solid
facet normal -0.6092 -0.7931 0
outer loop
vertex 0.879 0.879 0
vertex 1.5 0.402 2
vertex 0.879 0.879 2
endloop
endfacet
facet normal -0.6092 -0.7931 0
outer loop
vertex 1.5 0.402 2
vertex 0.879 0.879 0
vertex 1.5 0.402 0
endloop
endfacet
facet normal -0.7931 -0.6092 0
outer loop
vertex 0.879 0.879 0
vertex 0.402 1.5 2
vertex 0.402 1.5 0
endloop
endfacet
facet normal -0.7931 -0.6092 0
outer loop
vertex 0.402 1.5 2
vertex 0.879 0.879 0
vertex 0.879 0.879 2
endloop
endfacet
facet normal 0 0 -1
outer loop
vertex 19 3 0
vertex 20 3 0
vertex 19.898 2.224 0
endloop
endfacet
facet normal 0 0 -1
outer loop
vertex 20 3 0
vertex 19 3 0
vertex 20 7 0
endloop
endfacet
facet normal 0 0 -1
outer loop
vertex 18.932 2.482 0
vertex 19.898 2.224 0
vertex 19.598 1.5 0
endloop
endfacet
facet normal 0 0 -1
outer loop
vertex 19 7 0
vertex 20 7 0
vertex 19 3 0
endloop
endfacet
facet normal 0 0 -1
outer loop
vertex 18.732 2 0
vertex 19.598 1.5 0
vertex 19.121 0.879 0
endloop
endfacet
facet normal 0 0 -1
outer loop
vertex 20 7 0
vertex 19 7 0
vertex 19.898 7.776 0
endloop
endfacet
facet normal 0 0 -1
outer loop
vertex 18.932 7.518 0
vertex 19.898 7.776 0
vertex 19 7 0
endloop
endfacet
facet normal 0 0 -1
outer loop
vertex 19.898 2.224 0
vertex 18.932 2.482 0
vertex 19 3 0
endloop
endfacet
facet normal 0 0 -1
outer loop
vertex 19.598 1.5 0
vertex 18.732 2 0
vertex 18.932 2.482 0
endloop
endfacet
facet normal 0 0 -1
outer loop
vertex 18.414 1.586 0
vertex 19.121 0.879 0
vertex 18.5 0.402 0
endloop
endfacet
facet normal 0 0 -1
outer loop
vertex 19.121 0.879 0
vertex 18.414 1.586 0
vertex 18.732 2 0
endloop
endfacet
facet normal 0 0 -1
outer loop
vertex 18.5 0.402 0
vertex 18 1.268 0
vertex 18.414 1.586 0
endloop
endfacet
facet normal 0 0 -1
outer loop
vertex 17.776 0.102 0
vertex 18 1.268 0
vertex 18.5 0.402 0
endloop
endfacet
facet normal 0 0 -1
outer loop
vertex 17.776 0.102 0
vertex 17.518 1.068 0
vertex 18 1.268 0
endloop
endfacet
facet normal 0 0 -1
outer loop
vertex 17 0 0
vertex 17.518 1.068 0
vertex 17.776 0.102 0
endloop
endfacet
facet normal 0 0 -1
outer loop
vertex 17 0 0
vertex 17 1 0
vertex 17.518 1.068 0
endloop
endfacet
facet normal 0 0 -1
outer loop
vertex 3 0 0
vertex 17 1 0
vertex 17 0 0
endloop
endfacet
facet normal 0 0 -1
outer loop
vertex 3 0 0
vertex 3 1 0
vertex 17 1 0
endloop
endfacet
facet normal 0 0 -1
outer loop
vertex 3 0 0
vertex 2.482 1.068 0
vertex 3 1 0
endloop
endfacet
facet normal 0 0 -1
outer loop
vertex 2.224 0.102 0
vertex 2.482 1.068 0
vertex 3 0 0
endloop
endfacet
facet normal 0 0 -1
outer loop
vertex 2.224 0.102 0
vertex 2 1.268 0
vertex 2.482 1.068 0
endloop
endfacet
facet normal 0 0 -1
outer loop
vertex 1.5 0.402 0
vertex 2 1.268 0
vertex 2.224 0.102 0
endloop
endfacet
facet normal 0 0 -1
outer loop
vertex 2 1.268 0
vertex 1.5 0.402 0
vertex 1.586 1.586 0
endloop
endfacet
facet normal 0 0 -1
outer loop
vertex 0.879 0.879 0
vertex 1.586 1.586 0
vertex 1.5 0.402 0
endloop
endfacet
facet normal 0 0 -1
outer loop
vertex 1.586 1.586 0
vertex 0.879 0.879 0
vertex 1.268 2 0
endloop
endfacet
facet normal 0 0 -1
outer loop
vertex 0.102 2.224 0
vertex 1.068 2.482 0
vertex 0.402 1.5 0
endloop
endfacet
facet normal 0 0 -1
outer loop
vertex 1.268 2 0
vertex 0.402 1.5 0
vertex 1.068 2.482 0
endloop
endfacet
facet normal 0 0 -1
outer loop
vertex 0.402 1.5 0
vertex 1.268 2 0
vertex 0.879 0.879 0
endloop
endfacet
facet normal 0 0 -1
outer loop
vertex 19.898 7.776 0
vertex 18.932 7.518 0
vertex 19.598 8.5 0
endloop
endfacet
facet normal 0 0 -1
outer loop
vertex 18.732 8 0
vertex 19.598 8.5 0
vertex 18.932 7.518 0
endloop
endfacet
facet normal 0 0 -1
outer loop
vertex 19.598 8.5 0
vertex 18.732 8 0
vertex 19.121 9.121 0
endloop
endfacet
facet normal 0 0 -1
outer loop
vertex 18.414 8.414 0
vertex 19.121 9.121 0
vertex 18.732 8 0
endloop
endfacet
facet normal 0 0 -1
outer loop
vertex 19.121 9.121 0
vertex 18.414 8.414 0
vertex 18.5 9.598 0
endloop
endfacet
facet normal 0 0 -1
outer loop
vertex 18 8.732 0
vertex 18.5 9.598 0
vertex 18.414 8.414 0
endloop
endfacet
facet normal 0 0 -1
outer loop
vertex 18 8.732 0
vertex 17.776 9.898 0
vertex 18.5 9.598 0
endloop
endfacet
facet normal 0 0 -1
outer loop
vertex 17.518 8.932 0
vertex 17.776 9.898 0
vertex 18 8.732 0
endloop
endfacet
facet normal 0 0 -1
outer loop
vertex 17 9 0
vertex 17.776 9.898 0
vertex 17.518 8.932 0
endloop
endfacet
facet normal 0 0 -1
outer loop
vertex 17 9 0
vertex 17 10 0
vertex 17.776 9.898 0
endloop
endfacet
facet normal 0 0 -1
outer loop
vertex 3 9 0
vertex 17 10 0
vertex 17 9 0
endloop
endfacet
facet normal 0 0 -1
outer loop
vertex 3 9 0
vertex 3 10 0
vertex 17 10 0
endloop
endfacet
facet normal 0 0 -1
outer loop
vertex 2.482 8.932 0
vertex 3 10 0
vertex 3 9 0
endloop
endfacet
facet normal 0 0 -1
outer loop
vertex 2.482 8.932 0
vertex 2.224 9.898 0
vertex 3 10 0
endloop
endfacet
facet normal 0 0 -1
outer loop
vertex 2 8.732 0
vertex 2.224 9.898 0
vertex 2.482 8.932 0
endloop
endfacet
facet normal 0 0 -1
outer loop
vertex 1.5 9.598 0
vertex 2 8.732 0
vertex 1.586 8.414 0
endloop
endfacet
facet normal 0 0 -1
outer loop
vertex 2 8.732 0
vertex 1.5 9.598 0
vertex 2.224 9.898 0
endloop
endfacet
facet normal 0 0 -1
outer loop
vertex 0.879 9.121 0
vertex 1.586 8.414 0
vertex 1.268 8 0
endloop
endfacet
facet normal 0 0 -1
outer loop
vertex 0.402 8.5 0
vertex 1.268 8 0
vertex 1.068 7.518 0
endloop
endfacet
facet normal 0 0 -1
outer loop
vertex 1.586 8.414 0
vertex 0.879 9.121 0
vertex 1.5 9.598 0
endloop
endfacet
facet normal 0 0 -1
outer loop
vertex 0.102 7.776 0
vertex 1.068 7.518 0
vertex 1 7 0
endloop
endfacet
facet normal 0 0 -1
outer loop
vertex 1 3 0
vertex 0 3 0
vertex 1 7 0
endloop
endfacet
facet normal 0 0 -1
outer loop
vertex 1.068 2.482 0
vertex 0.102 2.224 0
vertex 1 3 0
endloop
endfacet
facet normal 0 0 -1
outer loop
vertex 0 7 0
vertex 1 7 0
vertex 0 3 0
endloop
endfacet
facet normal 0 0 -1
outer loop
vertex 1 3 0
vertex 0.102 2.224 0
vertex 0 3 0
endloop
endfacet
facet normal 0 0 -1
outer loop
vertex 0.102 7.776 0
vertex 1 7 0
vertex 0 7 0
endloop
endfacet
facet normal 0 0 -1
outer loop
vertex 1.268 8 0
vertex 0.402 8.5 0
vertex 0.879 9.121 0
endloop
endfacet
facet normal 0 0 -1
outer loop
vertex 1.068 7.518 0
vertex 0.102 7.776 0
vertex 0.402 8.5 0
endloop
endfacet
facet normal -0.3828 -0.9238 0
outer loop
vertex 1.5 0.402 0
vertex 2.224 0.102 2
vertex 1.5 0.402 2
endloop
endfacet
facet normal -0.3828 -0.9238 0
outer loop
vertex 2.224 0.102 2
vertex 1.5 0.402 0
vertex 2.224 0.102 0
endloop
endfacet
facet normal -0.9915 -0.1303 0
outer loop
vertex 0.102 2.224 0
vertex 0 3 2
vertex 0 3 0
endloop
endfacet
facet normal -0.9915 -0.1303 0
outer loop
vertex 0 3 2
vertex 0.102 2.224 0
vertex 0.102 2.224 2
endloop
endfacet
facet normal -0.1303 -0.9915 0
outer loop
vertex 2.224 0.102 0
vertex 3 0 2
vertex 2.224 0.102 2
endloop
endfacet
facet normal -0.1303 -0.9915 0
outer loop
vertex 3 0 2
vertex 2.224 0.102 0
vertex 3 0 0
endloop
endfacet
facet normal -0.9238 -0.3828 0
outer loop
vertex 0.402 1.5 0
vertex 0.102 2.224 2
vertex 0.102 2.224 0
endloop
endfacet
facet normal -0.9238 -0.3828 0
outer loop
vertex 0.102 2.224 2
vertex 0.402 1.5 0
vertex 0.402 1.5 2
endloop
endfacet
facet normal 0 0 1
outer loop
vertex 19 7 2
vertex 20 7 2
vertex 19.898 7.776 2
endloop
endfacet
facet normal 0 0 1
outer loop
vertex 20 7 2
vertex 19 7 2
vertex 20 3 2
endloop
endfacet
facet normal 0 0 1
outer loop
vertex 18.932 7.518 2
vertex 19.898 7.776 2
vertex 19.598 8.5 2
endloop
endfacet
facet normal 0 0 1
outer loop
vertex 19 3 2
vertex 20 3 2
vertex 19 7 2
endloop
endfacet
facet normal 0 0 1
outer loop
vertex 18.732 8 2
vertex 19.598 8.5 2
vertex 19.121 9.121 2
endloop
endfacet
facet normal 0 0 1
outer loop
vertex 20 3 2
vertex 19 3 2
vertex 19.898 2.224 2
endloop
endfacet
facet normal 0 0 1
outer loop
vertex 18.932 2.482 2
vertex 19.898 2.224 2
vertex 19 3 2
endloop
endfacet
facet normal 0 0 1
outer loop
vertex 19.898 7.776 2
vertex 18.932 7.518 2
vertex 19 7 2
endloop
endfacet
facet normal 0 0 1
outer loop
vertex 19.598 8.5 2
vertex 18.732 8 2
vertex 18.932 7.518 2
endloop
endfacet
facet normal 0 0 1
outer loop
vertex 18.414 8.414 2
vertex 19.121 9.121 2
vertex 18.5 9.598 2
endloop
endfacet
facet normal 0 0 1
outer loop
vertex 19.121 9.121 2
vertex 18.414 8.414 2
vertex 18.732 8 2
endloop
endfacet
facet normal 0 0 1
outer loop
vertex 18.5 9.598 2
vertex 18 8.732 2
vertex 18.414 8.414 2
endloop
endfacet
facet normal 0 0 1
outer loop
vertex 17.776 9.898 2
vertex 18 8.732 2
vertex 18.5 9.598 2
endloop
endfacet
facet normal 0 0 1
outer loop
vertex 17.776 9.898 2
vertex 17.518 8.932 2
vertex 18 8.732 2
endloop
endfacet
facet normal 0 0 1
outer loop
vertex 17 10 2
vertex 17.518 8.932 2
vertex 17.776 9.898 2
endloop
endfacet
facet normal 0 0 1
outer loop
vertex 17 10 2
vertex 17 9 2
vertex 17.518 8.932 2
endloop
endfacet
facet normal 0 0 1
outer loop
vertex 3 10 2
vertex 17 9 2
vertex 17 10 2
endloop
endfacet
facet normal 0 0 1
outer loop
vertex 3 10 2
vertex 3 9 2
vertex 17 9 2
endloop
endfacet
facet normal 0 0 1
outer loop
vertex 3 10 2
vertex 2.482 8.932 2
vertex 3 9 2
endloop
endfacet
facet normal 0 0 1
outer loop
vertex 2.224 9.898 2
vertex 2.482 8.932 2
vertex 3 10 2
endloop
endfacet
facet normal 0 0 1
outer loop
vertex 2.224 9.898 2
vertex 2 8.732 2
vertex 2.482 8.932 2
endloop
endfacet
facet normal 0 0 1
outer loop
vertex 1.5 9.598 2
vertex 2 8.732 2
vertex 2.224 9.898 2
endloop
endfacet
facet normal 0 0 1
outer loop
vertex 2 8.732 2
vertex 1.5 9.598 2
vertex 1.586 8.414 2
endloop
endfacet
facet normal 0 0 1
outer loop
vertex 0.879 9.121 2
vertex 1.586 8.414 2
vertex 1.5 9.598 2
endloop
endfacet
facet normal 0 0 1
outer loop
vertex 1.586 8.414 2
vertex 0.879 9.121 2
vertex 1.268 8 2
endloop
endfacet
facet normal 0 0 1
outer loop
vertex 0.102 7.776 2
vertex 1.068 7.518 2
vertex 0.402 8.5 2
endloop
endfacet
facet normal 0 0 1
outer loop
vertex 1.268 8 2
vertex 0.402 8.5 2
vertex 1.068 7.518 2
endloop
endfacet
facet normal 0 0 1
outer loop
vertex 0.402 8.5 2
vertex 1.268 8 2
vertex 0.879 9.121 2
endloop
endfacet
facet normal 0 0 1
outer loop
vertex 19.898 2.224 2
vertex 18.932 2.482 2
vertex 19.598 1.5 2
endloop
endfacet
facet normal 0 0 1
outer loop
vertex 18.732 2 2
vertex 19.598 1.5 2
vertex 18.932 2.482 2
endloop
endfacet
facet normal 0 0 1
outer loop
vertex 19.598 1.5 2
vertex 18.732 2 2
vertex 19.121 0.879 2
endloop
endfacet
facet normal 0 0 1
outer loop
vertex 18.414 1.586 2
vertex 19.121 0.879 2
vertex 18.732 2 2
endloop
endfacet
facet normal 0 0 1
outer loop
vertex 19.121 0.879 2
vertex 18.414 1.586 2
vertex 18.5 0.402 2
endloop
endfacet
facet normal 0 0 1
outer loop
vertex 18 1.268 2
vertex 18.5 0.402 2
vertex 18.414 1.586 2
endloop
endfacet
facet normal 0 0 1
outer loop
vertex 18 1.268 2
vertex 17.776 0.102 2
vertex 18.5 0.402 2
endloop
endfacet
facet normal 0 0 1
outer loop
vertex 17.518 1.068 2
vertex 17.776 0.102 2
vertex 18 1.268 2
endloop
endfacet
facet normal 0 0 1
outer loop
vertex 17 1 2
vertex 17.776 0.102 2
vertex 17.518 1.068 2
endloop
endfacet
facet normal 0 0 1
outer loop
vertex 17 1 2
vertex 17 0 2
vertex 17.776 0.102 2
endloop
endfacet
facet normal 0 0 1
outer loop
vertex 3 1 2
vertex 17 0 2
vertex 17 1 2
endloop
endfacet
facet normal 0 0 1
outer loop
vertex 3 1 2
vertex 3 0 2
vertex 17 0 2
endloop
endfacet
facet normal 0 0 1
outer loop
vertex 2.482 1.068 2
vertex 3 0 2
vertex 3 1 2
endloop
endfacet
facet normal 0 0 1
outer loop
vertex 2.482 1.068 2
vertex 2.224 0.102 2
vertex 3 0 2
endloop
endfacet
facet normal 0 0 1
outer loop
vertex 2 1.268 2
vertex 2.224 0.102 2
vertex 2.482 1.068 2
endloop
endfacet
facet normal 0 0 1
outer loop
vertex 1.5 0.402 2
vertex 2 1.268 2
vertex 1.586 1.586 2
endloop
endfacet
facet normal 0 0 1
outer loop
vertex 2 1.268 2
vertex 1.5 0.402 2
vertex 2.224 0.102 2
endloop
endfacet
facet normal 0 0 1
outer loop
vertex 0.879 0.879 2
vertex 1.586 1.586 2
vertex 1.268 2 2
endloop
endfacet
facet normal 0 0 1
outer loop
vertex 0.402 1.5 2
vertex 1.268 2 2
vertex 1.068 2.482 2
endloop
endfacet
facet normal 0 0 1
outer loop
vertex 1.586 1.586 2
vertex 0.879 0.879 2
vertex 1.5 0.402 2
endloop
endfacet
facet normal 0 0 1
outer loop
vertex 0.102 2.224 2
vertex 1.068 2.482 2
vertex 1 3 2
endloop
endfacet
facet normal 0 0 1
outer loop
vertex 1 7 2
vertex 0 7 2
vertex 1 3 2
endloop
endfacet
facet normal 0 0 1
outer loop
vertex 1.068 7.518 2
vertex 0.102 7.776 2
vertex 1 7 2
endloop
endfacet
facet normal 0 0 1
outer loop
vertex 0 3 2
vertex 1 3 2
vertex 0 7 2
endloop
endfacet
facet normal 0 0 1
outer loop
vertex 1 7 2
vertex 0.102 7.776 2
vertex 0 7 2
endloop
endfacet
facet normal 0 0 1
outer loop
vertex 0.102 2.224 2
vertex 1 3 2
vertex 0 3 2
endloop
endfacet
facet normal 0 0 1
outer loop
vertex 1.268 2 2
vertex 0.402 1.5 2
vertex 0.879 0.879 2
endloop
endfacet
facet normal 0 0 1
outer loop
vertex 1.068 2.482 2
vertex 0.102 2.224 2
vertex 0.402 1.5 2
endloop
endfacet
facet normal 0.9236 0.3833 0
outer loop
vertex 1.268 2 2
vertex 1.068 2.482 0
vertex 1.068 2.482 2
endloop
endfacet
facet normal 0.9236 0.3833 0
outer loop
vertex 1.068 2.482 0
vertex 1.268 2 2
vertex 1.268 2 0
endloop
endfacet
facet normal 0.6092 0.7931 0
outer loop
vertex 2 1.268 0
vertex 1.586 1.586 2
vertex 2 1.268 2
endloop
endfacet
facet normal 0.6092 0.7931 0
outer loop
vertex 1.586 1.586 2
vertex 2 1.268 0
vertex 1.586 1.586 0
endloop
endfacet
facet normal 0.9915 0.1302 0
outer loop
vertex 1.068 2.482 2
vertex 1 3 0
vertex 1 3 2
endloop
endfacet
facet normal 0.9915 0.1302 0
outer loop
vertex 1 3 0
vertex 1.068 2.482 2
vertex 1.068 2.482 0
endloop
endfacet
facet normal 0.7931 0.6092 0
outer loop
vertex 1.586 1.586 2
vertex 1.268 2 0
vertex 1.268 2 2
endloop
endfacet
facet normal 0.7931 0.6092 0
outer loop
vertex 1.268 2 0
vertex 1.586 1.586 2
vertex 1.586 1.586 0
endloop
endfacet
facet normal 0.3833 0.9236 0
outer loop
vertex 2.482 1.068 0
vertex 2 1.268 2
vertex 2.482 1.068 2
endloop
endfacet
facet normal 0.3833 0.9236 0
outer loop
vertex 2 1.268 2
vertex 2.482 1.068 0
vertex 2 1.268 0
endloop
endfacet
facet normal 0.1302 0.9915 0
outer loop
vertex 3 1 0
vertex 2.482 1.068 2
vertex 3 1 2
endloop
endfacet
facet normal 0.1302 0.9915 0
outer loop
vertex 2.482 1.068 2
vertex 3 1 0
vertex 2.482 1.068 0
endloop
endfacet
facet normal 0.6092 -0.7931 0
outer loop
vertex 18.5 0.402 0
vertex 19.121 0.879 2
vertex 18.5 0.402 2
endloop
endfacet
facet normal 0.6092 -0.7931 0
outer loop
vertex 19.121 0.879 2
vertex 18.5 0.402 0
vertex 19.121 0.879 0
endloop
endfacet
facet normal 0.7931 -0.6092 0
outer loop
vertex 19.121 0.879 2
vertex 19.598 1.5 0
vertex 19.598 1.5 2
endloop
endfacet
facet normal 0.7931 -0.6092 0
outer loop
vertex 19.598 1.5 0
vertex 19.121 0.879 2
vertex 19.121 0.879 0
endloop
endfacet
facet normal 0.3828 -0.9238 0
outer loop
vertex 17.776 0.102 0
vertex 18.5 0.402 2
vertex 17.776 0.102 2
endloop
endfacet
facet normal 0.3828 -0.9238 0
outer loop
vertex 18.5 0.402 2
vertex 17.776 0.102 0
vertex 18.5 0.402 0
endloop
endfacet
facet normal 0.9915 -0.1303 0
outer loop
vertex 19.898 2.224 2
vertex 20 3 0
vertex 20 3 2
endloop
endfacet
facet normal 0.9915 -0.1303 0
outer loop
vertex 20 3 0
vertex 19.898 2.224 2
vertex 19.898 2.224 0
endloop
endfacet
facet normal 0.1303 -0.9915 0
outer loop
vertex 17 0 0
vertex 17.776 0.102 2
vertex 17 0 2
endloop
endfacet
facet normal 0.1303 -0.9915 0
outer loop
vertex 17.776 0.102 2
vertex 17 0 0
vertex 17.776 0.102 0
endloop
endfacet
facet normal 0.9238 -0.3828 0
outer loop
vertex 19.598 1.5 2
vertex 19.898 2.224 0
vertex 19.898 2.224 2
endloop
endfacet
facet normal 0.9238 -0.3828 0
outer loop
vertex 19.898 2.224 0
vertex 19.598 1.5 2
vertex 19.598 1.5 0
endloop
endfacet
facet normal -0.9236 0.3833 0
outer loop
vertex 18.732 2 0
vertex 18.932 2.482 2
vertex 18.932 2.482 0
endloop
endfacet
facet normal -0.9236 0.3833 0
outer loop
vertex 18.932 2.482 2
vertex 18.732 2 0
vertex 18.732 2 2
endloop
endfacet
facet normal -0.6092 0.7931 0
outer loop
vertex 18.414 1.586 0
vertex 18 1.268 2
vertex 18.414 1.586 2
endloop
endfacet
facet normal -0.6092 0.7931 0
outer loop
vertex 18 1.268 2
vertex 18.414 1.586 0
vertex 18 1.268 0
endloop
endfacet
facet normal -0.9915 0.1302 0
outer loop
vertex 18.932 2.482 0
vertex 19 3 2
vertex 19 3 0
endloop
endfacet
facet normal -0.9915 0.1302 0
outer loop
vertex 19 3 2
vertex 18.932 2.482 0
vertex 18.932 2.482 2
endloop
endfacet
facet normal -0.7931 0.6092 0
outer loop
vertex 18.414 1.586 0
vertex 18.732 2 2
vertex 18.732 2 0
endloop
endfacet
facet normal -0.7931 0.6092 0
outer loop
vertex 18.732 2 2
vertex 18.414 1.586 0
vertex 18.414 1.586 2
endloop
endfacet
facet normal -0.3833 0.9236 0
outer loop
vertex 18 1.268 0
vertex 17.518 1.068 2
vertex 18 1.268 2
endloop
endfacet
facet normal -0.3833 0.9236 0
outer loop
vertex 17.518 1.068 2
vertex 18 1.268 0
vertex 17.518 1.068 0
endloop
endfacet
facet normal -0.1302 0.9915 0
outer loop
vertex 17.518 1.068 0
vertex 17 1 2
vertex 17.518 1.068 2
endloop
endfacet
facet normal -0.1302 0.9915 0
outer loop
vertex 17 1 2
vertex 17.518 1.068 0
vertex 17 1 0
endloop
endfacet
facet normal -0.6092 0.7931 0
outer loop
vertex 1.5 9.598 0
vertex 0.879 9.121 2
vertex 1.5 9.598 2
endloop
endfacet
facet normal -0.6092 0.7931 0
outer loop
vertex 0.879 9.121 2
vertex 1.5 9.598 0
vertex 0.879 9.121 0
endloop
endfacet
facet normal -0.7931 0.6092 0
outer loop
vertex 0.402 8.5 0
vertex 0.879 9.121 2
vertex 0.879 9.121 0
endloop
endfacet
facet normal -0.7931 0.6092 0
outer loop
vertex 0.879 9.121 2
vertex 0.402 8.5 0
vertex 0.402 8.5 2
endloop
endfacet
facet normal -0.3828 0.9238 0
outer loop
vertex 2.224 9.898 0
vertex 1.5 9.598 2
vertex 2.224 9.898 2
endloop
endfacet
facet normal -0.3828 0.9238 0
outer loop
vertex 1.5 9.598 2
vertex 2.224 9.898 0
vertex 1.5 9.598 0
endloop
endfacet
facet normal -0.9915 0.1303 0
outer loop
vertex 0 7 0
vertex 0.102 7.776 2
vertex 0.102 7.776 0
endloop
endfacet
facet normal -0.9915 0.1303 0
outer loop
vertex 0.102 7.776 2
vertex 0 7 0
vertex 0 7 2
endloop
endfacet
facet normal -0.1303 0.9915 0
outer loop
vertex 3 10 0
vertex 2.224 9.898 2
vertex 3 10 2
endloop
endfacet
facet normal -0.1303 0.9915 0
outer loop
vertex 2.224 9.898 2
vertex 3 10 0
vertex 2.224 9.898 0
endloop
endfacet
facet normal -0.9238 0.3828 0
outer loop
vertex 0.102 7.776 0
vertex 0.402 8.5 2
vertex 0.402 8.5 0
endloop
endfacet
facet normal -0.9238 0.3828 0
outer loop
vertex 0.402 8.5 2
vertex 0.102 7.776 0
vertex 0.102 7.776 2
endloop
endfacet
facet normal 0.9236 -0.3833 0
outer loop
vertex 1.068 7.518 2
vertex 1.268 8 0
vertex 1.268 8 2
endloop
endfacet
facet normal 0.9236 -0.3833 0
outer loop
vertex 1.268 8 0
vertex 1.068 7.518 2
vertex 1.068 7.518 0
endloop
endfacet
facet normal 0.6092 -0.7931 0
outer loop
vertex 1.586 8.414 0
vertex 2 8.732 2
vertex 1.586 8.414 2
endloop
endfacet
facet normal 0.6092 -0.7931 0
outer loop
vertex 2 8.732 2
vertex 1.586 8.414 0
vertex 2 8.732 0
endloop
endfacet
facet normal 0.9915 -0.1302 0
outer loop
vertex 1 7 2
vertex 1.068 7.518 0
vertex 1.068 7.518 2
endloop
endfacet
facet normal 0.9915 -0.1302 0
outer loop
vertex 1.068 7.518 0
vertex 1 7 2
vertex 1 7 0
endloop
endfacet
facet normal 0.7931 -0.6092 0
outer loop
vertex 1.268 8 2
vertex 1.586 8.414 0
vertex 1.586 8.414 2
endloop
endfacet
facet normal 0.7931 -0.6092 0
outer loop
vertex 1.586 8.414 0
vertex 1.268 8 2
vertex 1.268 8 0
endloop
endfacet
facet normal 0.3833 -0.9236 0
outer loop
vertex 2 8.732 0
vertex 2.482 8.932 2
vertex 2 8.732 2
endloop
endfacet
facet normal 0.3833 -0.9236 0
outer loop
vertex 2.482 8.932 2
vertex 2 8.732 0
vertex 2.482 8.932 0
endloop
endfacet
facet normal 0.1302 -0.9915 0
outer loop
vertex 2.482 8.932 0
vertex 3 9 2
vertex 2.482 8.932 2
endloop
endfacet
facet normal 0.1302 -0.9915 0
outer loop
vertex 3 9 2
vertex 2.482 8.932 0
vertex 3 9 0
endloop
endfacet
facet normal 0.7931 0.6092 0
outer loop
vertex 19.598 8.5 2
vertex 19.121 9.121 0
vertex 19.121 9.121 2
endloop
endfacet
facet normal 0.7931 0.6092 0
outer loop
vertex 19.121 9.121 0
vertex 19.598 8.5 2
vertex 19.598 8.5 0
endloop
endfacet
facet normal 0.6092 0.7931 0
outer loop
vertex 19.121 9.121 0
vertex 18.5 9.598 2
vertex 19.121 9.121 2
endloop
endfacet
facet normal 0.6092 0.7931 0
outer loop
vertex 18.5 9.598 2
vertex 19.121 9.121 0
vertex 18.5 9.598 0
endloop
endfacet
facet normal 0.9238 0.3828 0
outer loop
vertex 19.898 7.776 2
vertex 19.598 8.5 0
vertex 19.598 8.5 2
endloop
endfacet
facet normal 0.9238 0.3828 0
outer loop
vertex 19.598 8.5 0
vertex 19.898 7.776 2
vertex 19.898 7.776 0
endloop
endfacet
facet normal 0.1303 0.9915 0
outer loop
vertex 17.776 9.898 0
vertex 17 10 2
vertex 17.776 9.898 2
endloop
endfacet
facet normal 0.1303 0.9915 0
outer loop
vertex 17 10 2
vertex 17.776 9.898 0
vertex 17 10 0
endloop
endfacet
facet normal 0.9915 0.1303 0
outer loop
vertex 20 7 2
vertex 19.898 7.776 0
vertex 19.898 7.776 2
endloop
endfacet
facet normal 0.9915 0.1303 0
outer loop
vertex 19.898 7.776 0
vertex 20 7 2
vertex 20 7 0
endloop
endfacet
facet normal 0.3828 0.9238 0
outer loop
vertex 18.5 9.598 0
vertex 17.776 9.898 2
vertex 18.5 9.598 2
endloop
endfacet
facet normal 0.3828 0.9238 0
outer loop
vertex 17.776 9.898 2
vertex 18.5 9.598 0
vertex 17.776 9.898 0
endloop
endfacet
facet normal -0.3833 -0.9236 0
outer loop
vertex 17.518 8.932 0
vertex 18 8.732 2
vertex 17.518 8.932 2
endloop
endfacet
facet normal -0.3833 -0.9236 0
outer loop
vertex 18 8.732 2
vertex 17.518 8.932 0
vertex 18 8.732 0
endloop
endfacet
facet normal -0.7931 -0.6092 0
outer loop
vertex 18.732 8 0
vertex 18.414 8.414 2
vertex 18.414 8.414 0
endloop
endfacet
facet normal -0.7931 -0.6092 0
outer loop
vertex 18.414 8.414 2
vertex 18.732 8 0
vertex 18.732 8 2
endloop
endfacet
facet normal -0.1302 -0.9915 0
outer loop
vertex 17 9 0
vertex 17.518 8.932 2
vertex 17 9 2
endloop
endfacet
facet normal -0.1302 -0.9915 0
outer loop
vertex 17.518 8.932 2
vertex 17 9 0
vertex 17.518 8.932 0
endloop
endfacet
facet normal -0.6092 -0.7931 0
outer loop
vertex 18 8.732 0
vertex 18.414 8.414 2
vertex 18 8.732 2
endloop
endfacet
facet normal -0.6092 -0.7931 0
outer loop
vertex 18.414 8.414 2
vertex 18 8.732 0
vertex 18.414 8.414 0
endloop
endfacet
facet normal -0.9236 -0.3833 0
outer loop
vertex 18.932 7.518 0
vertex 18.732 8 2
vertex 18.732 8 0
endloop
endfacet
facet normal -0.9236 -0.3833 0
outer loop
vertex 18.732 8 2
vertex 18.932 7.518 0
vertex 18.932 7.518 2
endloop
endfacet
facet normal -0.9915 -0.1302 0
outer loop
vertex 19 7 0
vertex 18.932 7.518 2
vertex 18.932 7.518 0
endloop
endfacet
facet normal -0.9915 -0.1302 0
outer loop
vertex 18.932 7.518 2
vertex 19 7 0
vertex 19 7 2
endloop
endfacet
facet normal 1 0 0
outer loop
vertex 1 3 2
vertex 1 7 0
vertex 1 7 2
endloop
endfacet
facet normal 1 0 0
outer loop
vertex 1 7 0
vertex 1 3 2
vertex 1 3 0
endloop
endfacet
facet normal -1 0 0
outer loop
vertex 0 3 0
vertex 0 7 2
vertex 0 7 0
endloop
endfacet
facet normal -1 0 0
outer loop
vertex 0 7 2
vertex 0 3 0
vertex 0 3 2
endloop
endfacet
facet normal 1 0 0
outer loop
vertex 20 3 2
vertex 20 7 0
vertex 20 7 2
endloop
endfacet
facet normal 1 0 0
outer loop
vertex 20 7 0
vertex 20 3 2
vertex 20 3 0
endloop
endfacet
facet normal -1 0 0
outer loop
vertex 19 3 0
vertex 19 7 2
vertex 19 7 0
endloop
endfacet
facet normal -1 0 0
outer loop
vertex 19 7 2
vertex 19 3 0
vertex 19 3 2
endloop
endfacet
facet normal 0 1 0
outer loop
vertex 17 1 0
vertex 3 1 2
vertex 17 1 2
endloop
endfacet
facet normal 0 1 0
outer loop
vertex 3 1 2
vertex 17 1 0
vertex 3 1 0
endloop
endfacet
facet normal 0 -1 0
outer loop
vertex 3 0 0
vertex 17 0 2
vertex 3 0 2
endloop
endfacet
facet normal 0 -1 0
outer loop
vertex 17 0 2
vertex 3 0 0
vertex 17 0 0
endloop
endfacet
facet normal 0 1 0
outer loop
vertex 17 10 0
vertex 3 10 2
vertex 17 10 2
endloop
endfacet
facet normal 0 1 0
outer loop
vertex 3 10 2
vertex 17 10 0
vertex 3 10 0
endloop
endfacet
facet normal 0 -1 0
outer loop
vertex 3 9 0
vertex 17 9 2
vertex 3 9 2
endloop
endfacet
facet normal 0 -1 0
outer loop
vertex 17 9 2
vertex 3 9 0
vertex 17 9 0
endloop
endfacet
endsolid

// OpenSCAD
roundedsquaretube(20,10,2,1,3,fill=false);
// params:
// width
// length
// thickness of wall
// height
// radius of rounded corner

module roundedsquaretube(w,l,h,t,r,fill=false){

  
  roundedcorner(r,h,t,fill=fill);
    
  translate([w,0,0]) mirror([1,0,0]) roundedcorner(r,h,t,fill=fill);
    
  translate([0,l,0]) mirror([0,1,0]) roundedcorner(r,h,t,fill=fill);
  translate([w,l,0]) mirror([1,1,0]) roundedcorner(r,h,t,fill=fill);
    
  if (fill){
    translate([r,0,0]) cube([w-r-r,l,h]);
    translate([0,r,0]) cube([w,l-r-r,h]);
  } else {
    translate([0,r,0]) cube([t,l-r-r,h]);
    translate([w-t,r,0]) cube([t,l-r-r,h]);
    translate([r,0,0]) cube([w-r-r,t,h]);
    translate([r,l-t,0]) cube([w-r-r,t,h]);
  }
}

module roundedcorner(r,h,t,fill=false){
  intersection(){
    cube([r,r,h]);
    translate([r,r,0]){
      difference(){
        cylinder(d=r+r,h=h,$fn=24);
        if (!fill)
            translate([0,0,-1]) cylinder(d=r+r-t-t,h=h+2,$fn=24);
      }
    }
  }
}
